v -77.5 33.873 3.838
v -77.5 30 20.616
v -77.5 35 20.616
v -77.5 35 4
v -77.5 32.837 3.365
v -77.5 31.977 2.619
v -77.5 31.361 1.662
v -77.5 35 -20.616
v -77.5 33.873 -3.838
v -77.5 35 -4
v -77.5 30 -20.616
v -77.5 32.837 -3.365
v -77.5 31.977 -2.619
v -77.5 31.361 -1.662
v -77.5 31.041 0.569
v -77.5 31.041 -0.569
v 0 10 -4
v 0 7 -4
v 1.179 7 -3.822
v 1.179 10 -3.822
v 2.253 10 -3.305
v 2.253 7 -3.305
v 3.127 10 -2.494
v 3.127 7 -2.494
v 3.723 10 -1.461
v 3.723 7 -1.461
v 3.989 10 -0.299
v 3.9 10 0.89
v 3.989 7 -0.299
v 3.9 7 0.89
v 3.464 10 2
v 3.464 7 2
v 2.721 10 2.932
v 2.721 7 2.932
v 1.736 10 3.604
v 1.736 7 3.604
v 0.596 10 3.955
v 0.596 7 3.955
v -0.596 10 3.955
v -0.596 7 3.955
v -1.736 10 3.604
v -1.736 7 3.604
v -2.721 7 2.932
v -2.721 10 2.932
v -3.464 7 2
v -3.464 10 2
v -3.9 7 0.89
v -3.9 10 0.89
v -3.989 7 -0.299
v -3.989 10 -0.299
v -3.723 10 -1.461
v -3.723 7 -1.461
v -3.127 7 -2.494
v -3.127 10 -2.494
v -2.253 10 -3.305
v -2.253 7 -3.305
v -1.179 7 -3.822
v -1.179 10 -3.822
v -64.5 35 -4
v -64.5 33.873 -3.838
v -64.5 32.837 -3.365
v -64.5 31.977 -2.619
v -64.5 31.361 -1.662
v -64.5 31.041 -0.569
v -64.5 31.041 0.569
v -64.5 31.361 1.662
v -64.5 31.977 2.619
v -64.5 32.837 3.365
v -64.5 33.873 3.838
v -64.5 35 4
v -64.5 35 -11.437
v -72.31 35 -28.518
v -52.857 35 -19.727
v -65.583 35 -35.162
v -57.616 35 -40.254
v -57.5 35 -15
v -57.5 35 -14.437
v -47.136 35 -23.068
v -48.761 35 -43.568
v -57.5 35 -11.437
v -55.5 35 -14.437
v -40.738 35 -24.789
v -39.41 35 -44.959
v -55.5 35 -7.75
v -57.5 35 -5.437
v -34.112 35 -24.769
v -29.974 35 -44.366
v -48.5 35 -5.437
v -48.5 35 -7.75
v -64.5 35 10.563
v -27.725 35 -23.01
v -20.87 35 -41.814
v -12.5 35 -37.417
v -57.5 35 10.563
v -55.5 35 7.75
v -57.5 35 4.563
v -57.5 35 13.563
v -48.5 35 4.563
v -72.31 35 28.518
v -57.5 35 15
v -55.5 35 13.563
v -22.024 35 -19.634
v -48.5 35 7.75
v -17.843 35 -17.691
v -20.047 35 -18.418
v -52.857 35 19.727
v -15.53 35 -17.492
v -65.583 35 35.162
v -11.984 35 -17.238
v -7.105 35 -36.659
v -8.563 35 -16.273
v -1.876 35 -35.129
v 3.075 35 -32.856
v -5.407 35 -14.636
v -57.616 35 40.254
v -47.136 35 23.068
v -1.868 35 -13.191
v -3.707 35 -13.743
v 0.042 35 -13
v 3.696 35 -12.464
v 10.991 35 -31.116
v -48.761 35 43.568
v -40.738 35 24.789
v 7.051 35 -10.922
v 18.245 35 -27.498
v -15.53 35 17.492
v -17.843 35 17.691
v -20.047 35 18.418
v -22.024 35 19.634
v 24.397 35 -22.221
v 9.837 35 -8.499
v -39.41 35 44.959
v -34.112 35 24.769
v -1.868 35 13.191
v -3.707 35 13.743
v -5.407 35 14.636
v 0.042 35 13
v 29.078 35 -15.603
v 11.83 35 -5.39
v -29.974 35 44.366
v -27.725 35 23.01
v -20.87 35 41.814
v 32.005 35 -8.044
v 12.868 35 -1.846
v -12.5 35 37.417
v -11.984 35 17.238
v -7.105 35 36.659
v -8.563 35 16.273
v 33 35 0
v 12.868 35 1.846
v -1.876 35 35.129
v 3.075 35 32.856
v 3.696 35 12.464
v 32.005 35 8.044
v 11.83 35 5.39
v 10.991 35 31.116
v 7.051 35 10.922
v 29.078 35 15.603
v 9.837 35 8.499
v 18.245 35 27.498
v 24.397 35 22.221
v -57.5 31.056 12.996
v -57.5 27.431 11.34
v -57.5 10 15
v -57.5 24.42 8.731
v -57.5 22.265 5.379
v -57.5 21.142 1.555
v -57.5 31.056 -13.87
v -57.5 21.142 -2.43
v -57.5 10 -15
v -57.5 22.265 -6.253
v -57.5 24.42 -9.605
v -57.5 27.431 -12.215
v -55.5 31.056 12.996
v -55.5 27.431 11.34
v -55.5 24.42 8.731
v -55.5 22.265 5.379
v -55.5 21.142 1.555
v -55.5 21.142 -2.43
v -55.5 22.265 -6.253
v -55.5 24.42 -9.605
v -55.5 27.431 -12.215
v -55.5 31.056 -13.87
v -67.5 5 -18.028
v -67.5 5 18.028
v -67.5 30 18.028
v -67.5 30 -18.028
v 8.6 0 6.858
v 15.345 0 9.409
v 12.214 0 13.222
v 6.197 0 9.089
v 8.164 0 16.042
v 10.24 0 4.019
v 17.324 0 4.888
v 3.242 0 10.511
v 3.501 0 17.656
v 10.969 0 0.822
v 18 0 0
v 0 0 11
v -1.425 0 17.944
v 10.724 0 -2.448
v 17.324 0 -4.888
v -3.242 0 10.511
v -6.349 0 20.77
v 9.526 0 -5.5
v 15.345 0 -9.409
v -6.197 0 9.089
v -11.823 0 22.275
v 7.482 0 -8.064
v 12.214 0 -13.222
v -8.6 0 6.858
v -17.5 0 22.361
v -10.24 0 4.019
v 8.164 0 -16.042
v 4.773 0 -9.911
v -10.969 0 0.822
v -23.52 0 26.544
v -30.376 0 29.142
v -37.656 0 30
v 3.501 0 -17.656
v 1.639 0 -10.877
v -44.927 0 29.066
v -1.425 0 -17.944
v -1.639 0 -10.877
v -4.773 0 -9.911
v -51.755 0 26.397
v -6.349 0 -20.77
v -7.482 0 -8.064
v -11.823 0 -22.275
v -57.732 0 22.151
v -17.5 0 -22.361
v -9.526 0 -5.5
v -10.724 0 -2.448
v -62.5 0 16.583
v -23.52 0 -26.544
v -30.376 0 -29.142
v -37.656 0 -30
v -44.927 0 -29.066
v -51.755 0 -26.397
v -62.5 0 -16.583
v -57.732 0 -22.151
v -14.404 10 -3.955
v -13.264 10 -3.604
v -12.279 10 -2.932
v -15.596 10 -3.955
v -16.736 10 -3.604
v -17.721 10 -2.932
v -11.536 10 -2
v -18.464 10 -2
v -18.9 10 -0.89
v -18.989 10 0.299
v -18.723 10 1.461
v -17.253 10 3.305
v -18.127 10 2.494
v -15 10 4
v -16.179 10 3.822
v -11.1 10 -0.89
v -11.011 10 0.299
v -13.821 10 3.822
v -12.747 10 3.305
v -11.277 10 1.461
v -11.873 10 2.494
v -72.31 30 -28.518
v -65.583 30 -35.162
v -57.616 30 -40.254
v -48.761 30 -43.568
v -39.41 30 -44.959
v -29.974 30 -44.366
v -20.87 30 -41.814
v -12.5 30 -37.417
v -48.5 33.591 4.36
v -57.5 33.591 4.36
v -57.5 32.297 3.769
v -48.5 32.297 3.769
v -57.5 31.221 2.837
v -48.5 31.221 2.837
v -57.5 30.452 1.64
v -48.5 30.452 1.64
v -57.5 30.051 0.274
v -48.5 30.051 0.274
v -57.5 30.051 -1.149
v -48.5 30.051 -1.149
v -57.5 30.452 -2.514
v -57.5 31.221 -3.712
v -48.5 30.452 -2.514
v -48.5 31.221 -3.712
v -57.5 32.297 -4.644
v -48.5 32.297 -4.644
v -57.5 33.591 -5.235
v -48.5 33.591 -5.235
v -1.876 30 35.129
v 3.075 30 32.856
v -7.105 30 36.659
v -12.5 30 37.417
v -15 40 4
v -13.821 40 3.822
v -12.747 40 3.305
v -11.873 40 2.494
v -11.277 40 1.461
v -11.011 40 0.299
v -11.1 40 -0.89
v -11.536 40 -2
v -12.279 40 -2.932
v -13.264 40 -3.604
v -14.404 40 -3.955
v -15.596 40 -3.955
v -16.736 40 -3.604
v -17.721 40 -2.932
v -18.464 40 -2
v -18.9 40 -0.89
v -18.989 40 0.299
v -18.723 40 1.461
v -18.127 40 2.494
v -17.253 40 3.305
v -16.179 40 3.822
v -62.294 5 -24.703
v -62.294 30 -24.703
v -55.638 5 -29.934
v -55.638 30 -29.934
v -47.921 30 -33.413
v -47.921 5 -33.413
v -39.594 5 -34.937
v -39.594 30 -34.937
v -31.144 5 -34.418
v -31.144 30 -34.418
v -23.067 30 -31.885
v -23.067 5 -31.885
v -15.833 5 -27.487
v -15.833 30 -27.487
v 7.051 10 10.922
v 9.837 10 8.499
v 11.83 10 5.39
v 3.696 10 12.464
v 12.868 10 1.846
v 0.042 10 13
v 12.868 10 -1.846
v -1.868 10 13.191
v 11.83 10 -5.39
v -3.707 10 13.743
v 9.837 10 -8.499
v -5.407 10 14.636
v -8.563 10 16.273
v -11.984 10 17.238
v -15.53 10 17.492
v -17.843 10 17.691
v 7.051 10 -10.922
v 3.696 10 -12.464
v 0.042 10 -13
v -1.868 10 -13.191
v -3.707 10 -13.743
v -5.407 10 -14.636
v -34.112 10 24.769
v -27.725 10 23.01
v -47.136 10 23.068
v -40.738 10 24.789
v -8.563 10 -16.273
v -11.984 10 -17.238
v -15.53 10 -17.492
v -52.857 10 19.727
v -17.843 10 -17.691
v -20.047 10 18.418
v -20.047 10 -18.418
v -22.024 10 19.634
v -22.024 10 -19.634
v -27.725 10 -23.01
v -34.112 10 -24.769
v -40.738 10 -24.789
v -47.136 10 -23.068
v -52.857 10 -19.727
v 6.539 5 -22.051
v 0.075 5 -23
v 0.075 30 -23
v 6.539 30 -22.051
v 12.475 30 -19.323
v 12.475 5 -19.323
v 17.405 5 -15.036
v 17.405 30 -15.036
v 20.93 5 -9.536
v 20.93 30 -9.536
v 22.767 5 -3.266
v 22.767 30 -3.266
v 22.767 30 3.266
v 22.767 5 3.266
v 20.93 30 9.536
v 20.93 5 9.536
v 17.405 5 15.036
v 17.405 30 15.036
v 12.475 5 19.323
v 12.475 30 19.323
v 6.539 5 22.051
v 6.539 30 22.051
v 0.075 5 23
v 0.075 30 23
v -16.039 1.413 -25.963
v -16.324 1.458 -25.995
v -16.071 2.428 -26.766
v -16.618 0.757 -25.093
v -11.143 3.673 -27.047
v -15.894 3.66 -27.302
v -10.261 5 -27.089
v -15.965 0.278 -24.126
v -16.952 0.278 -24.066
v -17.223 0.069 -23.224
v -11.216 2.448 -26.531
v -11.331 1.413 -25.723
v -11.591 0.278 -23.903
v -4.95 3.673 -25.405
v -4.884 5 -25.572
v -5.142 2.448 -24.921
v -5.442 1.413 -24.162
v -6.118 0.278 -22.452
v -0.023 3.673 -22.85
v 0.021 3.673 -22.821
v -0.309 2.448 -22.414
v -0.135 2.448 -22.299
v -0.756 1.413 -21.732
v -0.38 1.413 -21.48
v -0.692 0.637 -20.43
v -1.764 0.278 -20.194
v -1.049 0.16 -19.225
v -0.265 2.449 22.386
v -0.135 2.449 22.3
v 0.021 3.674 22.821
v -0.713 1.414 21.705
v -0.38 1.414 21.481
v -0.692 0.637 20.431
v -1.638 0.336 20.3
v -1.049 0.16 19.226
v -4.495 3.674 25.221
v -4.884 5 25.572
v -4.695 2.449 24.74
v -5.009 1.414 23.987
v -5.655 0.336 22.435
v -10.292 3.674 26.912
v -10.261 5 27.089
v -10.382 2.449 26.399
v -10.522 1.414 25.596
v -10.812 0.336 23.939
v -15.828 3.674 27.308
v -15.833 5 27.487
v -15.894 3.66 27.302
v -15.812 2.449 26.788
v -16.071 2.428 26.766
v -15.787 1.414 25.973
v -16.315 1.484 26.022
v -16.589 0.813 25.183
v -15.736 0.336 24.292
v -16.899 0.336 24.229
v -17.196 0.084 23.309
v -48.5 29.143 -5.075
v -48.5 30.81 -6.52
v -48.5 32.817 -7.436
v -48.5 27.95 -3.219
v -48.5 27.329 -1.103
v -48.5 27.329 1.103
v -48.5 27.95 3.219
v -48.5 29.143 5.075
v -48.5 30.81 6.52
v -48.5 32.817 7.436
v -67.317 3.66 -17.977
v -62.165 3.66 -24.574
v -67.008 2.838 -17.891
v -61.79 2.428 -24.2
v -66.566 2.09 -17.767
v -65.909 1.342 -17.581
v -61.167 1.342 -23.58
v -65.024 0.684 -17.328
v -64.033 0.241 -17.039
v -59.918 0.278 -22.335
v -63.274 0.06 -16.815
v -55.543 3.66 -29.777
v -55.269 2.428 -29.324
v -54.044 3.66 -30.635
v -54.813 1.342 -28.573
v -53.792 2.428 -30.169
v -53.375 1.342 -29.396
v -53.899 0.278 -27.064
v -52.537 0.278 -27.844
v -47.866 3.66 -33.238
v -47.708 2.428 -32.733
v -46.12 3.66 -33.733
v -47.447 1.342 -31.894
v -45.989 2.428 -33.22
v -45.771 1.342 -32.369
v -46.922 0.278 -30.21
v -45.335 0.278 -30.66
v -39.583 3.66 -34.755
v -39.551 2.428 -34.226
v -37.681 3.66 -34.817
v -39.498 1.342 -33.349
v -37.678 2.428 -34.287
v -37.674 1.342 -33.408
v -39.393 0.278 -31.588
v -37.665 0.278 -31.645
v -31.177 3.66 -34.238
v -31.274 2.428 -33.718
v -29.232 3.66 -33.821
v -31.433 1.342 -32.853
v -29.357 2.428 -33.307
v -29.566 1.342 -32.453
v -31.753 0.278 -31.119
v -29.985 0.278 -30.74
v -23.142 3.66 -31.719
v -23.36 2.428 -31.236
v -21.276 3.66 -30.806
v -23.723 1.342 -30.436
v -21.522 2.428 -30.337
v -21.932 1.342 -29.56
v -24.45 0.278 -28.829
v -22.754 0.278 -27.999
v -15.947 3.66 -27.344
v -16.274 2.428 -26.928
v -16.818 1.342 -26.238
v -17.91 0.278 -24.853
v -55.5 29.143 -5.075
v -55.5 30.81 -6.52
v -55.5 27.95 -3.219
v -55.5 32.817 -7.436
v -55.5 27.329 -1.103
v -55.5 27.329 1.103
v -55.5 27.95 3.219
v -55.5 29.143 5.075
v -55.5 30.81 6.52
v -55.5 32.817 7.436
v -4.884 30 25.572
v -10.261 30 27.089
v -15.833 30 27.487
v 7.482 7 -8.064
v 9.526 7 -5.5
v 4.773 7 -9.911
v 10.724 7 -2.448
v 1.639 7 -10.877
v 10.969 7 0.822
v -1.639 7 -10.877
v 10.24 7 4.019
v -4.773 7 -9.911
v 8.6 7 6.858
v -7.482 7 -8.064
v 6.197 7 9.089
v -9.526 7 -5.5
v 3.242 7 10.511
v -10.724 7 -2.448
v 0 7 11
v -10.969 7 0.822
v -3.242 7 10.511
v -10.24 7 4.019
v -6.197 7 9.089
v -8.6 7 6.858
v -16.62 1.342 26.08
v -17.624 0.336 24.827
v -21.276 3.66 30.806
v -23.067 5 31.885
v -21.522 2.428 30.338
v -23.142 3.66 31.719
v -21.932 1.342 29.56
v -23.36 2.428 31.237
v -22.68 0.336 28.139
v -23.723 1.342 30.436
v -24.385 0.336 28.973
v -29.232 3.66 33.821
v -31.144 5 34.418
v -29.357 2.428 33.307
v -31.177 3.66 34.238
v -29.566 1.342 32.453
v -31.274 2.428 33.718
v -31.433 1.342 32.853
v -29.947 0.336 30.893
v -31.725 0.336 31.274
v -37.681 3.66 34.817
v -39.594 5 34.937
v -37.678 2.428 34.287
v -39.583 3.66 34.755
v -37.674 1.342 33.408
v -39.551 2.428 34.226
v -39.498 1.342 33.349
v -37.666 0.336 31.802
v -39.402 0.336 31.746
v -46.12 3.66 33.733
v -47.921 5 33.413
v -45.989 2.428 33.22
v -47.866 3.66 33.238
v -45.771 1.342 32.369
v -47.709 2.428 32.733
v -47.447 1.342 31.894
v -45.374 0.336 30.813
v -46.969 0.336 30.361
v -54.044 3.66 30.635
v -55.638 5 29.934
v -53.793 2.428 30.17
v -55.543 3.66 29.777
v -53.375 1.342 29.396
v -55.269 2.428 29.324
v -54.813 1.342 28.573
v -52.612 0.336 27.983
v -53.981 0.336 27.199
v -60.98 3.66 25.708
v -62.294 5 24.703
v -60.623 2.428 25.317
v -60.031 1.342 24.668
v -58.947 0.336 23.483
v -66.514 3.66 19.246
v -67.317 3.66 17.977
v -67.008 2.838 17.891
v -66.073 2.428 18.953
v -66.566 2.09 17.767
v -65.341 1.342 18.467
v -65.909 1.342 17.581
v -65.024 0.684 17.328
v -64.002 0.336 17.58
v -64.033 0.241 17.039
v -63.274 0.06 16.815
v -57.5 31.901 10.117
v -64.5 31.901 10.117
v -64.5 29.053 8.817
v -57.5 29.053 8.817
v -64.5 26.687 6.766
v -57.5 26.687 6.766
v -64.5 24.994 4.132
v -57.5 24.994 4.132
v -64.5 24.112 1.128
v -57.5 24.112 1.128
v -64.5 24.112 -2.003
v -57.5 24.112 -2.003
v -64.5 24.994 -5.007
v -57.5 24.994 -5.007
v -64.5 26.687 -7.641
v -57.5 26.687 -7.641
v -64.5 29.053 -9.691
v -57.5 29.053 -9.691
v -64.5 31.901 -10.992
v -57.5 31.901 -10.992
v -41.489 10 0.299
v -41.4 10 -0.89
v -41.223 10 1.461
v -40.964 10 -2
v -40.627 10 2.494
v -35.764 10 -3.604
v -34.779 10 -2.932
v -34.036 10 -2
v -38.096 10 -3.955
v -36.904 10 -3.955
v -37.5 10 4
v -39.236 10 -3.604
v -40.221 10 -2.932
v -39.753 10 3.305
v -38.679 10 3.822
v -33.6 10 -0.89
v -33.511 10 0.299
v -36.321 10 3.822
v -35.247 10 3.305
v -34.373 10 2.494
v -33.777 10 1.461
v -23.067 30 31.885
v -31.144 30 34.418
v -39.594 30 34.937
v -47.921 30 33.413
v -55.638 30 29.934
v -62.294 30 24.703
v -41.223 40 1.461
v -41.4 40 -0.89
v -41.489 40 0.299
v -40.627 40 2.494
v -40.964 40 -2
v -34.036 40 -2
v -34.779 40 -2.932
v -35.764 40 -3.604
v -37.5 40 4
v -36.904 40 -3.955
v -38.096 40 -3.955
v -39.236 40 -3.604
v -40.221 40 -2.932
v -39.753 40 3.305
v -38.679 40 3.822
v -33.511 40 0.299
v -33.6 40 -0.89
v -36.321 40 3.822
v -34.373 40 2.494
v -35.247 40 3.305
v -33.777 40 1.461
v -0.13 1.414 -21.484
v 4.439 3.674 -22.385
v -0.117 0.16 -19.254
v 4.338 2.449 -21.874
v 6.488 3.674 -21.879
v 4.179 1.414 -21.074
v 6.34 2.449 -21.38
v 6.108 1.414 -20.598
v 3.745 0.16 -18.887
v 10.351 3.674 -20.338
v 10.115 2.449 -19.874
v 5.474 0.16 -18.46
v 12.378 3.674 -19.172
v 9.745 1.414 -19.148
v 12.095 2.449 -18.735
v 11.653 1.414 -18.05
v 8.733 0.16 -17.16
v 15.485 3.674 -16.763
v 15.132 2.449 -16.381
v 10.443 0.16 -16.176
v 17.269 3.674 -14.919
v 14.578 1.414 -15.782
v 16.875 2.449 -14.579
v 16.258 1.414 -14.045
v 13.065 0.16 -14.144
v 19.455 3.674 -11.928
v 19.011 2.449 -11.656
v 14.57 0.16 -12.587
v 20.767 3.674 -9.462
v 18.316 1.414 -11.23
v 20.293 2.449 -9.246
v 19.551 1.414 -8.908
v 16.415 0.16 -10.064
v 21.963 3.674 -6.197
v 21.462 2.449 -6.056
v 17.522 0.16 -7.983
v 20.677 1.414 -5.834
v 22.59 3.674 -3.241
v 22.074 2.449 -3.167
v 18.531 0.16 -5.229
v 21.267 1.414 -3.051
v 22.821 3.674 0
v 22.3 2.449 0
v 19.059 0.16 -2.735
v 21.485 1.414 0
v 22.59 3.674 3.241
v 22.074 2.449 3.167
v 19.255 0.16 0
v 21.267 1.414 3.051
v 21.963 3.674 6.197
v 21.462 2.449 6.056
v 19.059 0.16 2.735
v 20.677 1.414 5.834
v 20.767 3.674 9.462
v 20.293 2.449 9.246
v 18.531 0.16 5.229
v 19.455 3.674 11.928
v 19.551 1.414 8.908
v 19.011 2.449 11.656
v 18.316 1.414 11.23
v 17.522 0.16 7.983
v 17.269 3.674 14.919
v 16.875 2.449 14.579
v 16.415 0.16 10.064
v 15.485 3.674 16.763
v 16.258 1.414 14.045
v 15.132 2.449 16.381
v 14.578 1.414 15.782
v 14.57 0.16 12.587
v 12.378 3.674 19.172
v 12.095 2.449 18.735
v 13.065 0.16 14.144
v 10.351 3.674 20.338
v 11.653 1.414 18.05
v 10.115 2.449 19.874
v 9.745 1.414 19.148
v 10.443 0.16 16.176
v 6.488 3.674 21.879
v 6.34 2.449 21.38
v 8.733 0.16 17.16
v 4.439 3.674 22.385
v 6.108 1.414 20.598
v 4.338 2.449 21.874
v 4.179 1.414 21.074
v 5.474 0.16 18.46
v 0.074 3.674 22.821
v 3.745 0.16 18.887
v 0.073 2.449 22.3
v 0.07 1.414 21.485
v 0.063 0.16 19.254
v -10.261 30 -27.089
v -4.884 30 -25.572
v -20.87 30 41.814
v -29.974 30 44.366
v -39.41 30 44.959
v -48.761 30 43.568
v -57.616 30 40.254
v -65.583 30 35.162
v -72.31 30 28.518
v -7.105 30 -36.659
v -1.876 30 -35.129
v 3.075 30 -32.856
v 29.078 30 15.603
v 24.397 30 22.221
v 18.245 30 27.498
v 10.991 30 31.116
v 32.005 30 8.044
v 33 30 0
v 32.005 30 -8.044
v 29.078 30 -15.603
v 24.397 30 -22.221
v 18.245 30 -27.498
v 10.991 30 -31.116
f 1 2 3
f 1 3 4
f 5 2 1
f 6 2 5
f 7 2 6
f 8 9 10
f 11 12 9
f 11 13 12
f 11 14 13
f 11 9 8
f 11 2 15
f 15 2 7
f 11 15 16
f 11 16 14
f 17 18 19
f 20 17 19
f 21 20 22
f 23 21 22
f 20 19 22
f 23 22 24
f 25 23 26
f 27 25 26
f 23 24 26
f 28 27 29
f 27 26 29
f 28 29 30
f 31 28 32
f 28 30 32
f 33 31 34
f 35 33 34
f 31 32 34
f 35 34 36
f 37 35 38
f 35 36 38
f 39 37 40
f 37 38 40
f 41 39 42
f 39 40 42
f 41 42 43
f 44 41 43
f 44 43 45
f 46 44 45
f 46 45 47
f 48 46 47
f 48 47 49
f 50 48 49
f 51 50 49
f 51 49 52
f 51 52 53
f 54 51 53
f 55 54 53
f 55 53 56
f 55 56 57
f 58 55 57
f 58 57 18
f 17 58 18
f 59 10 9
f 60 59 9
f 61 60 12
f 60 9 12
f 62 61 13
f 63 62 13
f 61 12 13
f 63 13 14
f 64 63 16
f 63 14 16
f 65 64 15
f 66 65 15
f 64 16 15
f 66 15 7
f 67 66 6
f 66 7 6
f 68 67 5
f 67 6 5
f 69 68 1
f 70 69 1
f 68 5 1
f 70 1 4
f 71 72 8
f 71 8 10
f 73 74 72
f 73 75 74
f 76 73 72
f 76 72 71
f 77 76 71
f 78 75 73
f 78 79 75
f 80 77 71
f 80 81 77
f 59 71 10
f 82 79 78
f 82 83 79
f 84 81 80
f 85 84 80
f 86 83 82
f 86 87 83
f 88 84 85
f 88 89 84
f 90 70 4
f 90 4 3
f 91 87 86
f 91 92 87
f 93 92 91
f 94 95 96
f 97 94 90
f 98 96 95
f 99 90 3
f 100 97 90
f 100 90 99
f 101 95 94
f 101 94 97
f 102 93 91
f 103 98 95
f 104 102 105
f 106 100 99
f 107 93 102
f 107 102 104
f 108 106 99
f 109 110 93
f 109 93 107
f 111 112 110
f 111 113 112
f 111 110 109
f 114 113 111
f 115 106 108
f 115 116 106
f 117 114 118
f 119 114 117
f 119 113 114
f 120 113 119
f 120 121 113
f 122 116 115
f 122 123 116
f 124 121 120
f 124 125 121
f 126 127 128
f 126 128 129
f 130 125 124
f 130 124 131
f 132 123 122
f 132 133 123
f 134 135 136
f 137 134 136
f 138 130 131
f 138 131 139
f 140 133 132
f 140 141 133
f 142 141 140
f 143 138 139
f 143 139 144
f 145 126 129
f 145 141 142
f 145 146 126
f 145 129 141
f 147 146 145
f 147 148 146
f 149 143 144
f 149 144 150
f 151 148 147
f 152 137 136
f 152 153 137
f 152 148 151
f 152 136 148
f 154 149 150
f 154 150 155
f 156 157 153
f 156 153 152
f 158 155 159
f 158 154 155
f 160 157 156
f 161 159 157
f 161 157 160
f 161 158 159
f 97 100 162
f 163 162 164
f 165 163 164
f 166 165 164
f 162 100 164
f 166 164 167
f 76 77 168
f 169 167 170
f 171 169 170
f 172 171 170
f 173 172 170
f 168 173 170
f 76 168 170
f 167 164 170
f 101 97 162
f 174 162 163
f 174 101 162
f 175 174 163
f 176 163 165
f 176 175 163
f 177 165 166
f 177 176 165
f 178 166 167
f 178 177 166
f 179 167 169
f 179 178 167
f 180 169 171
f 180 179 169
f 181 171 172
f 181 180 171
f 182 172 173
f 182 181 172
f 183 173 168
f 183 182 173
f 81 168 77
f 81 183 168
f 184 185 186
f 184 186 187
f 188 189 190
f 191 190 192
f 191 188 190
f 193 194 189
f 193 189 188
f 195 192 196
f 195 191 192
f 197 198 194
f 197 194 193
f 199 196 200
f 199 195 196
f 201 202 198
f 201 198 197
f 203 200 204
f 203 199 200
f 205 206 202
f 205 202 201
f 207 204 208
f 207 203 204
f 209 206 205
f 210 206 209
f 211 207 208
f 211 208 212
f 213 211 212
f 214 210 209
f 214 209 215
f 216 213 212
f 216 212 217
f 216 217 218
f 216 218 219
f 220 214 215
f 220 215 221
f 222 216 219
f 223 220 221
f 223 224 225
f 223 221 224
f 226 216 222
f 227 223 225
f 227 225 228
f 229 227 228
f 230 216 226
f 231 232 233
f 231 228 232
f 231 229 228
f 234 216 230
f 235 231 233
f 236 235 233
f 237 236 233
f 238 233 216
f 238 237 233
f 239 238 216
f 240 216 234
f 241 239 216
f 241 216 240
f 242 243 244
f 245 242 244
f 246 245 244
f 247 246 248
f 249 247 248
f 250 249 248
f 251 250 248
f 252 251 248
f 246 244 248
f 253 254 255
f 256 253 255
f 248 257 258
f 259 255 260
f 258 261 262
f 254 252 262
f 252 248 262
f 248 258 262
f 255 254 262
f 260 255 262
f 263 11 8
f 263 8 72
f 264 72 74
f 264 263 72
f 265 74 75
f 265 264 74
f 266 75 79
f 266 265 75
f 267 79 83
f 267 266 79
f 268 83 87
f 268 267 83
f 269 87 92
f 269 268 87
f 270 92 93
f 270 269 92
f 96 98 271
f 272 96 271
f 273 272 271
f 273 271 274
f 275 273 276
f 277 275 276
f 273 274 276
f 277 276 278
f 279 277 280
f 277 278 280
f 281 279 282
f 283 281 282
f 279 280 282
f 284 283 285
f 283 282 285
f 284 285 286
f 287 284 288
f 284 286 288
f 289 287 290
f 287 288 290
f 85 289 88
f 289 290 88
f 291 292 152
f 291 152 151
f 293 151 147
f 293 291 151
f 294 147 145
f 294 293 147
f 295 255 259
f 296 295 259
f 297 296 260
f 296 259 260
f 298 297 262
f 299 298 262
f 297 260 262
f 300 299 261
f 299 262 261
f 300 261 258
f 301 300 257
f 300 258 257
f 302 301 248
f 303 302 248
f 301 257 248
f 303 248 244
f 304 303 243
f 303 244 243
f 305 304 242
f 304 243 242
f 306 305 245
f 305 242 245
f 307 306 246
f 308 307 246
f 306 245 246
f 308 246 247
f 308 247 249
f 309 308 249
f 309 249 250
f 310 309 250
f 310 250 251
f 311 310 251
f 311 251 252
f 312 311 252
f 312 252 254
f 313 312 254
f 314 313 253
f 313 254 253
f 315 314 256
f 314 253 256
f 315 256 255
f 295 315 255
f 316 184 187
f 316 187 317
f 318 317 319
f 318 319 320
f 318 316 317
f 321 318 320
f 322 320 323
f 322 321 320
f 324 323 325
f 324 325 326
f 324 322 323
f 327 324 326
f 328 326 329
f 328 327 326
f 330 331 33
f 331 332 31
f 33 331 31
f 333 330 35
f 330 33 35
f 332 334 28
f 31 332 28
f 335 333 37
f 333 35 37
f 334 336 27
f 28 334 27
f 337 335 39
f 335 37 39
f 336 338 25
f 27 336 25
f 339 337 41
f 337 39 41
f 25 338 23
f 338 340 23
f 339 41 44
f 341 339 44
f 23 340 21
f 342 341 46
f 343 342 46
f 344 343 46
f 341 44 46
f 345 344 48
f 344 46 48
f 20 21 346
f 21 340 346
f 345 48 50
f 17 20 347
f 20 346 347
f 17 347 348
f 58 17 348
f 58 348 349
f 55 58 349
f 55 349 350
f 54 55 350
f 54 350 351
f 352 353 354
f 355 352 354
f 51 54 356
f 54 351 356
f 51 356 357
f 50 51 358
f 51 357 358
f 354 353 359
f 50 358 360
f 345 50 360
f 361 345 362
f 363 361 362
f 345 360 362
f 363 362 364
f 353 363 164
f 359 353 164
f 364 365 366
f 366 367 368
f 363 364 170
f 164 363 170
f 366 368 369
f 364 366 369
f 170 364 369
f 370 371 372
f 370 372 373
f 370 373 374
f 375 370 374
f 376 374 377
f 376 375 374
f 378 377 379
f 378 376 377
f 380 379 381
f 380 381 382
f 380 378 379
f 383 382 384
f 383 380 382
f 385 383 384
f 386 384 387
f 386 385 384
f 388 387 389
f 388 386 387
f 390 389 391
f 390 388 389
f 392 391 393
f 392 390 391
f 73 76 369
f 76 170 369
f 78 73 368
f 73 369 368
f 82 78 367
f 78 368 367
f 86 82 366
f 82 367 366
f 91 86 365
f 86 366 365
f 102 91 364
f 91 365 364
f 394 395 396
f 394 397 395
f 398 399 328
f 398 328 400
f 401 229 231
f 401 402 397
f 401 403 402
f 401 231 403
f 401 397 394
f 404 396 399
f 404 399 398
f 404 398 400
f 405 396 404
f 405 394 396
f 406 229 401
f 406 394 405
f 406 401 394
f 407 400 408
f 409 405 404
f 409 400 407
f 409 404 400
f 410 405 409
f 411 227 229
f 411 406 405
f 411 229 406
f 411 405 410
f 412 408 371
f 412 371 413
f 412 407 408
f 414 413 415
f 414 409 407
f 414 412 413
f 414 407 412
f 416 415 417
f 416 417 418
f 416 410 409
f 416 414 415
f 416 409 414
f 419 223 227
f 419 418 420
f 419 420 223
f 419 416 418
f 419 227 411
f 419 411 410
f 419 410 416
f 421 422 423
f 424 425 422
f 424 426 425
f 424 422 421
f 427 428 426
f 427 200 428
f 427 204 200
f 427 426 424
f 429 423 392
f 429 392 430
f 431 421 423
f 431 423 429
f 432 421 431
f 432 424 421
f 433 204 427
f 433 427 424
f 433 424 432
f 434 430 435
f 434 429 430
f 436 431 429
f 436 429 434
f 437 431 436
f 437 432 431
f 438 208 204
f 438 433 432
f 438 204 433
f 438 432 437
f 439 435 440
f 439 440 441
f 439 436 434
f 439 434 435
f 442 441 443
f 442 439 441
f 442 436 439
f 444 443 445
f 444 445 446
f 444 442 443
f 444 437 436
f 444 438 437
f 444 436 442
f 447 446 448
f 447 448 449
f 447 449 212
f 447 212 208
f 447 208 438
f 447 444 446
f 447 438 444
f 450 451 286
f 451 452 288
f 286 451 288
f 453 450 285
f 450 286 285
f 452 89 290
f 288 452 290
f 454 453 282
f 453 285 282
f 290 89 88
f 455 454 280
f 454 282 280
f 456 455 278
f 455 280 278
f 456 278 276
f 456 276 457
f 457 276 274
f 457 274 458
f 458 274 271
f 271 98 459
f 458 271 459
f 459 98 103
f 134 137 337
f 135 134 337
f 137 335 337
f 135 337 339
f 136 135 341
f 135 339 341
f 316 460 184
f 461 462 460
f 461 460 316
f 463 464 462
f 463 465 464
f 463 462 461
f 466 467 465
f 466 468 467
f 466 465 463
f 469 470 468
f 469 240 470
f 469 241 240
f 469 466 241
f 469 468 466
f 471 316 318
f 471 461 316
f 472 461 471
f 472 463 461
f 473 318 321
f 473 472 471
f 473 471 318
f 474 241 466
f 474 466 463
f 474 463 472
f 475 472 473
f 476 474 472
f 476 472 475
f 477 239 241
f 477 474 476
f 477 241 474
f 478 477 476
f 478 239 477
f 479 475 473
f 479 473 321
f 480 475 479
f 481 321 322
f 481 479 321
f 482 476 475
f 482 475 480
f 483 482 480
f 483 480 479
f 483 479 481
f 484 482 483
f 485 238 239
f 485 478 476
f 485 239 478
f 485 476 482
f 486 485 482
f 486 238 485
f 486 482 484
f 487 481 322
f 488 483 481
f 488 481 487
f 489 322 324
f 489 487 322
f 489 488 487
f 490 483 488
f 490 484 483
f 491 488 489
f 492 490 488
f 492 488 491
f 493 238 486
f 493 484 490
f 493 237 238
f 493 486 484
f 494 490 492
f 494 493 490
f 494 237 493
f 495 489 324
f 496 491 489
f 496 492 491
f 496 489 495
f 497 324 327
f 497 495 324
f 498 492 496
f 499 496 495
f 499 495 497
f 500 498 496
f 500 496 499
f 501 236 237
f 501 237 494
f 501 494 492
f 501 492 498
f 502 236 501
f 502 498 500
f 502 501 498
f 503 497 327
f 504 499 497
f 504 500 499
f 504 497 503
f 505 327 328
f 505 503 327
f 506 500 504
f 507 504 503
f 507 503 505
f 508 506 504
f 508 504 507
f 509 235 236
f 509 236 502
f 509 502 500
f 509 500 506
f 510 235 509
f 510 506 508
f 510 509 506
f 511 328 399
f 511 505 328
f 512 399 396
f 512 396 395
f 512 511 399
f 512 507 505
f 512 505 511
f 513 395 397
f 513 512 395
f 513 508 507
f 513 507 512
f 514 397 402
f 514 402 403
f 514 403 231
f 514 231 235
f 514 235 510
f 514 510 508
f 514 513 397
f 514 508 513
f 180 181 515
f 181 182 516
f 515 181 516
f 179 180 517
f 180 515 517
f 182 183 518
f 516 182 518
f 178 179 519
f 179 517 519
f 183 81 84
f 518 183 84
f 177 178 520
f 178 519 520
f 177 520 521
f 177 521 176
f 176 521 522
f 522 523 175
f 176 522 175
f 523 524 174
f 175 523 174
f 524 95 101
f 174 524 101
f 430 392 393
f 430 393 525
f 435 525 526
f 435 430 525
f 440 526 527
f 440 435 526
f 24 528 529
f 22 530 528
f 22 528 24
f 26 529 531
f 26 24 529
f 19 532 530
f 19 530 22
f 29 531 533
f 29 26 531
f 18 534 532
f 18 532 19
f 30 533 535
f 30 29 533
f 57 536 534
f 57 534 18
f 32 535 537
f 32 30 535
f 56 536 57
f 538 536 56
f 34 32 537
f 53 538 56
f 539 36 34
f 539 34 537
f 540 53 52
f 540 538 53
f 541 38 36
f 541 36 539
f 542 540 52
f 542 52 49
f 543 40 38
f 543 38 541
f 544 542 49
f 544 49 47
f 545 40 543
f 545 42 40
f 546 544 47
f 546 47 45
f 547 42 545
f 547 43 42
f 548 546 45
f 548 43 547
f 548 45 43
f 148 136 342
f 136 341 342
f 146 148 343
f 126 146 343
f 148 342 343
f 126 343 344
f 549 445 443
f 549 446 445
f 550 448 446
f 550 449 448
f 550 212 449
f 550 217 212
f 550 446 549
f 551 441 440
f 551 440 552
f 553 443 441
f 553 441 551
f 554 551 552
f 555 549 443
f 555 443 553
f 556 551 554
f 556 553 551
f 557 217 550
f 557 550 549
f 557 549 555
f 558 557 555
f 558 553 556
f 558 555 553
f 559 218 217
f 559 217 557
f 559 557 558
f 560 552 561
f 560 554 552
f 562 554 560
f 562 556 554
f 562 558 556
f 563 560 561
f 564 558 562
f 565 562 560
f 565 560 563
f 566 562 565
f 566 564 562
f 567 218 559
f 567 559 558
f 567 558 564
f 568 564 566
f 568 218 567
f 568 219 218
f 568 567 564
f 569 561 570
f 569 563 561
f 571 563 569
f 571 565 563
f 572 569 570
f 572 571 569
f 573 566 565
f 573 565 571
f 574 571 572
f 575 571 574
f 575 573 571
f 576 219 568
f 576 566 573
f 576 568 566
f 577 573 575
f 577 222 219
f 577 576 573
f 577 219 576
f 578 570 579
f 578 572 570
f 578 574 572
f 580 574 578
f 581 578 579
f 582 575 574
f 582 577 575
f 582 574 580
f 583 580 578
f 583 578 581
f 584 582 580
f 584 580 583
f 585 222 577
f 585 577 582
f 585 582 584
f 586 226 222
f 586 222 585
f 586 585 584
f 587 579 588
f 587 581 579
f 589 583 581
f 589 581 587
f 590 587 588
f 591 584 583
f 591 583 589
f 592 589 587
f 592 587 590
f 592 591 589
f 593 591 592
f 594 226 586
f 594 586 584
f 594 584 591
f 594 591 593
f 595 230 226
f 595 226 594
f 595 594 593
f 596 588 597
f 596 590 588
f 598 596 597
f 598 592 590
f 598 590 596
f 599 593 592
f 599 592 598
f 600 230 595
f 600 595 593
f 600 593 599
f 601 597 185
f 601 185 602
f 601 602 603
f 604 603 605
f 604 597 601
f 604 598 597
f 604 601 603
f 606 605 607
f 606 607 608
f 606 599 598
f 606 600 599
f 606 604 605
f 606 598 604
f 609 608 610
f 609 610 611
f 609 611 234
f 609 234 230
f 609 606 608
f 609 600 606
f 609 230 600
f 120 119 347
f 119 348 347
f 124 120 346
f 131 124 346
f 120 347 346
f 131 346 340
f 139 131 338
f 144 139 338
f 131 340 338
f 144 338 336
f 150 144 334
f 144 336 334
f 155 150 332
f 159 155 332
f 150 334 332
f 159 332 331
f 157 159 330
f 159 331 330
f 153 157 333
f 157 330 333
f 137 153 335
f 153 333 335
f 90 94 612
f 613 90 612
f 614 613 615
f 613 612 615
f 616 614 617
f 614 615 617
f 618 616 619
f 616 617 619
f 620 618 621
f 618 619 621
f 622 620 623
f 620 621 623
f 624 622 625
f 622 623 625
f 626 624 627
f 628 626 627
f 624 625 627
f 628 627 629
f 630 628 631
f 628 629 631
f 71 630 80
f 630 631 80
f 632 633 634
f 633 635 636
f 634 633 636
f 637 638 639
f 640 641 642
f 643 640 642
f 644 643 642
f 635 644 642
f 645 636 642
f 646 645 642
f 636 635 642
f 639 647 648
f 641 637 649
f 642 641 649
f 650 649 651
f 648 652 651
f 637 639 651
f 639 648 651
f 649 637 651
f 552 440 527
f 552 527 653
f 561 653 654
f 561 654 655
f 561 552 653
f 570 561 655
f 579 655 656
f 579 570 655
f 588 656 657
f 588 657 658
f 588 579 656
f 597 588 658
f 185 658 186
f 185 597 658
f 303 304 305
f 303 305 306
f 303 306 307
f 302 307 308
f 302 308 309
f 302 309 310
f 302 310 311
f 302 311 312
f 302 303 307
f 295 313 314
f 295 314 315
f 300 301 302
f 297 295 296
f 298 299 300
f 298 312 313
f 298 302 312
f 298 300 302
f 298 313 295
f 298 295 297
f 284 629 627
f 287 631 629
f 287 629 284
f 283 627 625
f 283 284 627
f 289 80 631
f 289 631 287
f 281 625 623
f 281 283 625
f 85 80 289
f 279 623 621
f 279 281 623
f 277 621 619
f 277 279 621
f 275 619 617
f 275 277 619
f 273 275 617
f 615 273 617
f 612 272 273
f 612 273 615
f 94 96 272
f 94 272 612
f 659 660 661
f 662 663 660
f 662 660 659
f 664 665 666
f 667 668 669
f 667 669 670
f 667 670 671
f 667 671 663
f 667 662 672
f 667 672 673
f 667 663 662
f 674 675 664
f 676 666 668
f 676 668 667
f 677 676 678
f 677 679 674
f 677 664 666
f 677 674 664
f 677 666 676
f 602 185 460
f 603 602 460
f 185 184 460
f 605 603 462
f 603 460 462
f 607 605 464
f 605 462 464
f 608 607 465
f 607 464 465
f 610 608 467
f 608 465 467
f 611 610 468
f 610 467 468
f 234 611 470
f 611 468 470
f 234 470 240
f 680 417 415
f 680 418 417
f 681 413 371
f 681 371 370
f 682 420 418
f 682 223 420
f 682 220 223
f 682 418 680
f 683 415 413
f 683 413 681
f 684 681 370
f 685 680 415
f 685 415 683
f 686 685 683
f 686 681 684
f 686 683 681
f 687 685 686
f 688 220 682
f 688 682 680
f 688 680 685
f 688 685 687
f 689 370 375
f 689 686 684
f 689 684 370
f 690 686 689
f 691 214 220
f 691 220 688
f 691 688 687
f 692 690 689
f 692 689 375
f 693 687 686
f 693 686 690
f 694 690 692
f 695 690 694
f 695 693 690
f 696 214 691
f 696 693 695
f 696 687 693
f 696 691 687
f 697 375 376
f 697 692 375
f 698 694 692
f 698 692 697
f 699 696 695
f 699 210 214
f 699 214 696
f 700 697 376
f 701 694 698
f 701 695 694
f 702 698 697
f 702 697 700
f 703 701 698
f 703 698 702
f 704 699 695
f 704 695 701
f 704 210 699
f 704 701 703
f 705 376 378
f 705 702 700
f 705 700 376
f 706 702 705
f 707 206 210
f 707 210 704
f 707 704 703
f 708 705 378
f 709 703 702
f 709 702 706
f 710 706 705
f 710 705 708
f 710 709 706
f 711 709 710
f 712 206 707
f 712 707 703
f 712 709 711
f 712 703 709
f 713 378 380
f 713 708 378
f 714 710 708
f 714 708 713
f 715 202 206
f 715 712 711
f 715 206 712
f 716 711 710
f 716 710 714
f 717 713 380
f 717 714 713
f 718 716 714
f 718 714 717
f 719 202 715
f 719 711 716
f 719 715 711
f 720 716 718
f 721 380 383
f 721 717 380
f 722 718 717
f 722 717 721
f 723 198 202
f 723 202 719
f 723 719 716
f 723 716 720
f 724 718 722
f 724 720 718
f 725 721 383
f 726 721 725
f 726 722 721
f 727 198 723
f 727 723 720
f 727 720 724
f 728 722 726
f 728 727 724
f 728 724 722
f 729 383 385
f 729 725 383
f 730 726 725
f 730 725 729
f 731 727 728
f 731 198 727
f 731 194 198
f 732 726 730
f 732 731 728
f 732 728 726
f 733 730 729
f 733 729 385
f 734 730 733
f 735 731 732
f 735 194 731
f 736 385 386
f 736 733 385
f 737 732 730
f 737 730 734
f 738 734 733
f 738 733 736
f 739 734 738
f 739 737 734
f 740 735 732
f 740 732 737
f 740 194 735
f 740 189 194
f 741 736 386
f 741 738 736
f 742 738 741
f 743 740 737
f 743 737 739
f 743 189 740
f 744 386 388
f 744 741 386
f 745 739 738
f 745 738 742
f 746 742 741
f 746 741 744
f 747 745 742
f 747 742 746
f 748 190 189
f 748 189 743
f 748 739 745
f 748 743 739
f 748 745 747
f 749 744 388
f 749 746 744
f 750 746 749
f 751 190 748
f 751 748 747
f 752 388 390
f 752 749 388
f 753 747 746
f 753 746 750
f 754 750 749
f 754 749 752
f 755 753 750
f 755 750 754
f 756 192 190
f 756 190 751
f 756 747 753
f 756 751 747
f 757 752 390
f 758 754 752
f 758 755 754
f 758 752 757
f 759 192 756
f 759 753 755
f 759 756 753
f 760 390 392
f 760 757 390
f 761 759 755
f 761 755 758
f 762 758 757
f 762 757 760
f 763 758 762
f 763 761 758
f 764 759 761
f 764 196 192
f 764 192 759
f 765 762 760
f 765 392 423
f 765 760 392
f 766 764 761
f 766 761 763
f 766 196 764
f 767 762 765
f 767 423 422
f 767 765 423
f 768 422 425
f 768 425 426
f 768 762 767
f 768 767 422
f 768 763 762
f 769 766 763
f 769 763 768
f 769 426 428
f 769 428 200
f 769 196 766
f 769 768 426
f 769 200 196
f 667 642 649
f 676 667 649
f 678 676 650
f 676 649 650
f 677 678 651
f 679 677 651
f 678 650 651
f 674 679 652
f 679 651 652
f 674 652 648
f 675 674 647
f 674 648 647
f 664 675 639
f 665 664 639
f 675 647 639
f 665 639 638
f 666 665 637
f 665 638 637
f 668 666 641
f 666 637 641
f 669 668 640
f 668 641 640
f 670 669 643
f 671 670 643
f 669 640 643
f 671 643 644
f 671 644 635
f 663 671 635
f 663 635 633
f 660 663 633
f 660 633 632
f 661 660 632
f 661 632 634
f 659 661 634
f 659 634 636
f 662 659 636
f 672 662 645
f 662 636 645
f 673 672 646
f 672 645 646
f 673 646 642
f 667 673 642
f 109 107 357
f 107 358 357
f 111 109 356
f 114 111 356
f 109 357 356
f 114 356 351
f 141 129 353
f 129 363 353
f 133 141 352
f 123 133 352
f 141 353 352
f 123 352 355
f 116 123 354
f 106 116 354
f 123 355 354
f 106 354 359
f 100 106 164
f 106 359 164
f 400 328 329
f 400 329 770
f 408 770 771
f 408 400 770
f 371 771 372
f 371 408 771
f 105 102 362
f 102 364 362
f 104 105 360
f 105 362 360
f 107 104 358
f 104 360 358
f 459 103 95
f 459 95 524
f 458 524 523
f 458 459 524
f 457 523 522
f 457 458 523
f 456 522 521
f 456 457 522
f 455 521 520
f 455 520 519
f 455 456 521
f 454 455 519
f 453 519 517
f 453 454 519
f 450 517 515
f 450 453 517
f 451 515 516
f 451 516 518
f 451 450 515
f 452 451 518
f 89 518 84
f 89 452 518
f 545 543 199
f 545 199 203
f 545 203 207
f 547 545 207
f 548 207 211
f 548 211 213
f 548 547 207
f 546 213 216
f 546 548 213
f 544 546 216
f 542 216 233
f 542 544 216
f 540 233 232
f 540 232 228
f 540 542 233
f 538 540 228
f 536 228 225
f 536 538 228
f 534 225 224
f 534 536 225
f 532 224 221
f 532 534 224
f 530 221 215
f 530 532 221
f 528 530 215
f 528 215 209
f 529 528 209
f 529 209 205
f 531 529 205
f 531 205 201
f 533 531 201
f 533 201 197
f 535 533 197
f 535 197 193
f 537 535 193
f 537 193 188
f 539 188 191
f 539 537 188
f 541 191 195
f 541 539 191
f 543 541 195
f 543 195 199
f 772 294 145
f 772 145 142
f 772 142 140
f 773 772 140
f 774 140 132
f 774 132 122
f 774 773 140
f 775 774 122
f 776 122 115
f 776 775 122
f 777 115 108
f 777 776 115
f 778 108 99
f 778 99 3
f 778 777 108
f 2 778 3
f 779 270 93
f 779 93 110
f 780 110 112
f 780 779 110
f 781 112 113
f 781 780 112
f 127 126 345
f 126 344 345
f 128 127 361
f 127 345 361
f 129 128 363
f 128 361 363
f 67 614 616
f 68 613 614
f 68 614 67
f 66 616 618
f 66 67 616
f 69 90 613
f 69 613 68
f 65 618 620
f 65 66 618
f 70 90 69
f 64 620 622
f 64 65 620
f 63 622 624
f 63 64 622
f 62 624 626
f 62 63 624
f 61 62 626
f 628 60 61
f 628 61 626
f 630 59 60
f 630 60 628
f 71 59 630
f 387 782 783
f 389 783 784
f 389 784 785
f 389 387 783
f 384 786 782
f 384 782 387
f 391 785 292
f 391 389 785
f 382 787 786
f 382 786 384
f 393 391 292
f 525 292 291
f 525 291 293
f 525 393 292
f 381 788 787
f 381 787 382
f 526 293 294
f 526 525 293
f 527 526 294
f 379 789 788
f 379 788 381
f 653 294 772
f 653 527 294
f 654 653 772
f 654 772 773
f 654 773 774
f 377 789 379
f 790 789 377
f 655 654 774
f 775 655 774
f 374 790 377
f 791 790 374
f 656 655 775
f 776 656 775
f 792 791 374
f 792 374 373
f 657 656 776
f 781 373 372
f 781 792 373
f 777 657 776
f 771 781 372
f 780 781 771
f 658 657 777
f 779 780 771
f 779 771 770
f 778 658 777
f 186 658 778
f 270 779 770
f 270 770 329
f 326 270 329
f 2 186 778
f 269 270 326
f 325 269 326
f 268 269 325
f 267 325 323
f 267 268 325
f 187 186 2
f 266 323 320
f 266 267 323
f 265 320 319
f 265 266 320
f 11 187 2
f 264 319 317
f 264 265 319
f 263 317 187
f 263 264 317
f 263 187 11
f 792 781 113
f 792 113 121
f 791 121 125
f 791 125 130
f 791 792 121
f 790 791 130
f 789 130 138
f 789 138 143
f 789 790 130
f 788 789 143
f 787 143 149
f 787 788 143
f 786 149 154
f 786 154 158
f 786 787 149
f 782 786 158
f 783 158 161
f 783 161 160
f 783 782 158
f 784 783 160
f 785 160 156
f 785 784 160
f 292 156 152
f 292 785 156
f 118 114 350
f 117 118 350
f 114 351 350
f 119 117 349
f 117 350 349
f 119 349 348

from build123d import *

# Parameters (mm, degrees)
SKETCH1_R             = 4
SKETCH1_R_2           = 11
BOSS_EXTRUDE1_DEPTH   = 10
BOSS_EXTRUDE2_DEPTH   = 30
BOSS_EXTRUDE3_DEPTH   = 5
SKETCH6_R             = 11
CUT_EXTRUDE2_DEPTH    = 7
CUT_EXTRUDE3_REACH    = 126.339
SKETCH3_R             = 4
FILLET1_R             = 5
BOSS_EXTRUDE4_START   = 10
SKETCH1_4_R           = 4
BOSS_EXTRUDE4_DEPTH   = 30
BOSS_EXTRUDE4_2_DEPTH = 30
CUT_EXTRUDE5_START    = 3
SKETCH7_R             = 11
CUT_EXTRUDE5_DEPTH    = 7
SKETCH8_R             = 4
CUT_EXTRUDE6_DEPTH    = 96.5
BOSS_EXTRUDE8_START   = 9
BOSS_EXTRUDE8_DEPTH   = 9
CUT_EXTRUDE7_DEPTH    = 7


with BuildPart() as part:
    # Sketch1 → Boss-Extrude1 (new body)
    # profile 1 of 4: a face of its own
    with BuildSketch(Plane(origin=(0, 0, 0), x_dir=(1, 0, 0), z_dir=(0, 1, 0))):
        with BuildLine():
            ThreePointArc((-15.53030303, -17.49196326), (-18.965809959, -17.990656132), (-22.023809524, -19.633836312))
            ThreePointArc((-22.023809524, -19.633836312), (-40.737950416, -24.78942672), (-57.5, -15))
            Line((-57.5, -15), (-57.5, 15))
            ThreePointArc((-57.5, 15), (-40.737950416, 24.78942672), (-22.023809524, 19.633836312))
            ThreePointArc((-22.023809524, 19.633836312), (-18.965809959, 17.990656132), (-15.53030303, 17.49196326))
            ThreePointArc((-15.53030303, 17.49196326), (-10.248929974, 16.842723462), (-5.406818182, 14.63628582))
            ThreePointArc((-5.406818182, 14.63628582), (-2.801045952, 13.422385369), (0.042391304, 12.999930884))
            ThreePointArc((0.042391304, 12.999930884), (13, 0), (0.042391304, -12.999930884))
            ThreePointArc((0.042391304, -12.999930884), (-2.801045952, -13.422385369), (-5.406818182, -14.63628582))
            ThreePointArc((-5.406818182, -14.63628582), (-10.248929974, -16.842723462), (-15.53030303, -17.49196326))
        make_face()
        with Locations((-37.5, 0)):
            Circle(SKETCH1_R, mode=Mode.SUBTRACT)
        Circle(SKETCH1_R_2, mode=Mode.SUBTRACT)
        with Locations((-15, 0)):
            Circle(SKETCH1_R, mode=Mode.SUBTRACT)
    # profile 2 of 4: a face of its own
    with BuildSketch(Plane(origin=(0, 0, 0), x_dir=(1, 0, 0), z_dir=(0, 1, 0))):
        with Locations((-37.5, 0)):
            Circle(SKETCH1_R)
    # profile 3 of 4: a face of its own
    with BuildSketch(Plane(origin=(0, 0, 0), x_dir=(1, 0, 0), z_dir=(0, 1, 0))):
        with Locations((-15, 0)):
            Circle(SKETCH1_R)
    # profile 4 of 4: a face of its own
    with BuildSketch(Plane(origin=(0, 0, 0), x_dir=(1, 0, 0), z_dir=(0, 1, 0))):
        Circle(SKETCH1_R_2)
    extrude(amount=BOSS_EXTRUDE1_DEPTH)

    # Sketch1<3> → Boss-Extrude2 (add)
    with BuildSketch(Plane(origin=(0, 0, 0), x_dir=(1, 0, 0), z_dir=(0, 1, 0))):
        with BuildLine():
            Line((-67.5, -18.027756377), (-67.5, 18.027756377))
            ThreePointArc((-67.5, 18.027756377), (-43.803347329, 34.427718665), (-15.833333333, 27.487370837))
            ThreePointArc((-15.833333333, 27.487370837), (-7.534032816, 26.467136868), (0.075, 22.999877717))
            ThreePointArc((0.075, 22.999877717), (23, 0), (0.075, -22.999877717))
            ThreePointArc((0.075, -22.999877717), (-7.534032816, -26.467136868), (-15.833333333, -27.487370837))
            ThreePointArc((-15.833333333, -27.487370837), (-43.803347329, -34.427718665), (-67.5, -18.027756377))
        make_face()
        with BuildLine():
            Line((-57.5, -15), (-57.5, 15))
            ThreePointArc((-57.5, 15), (-40.737950416, 24.78942672), (-22.023809524, 19.633836312))
            ThreePointArc((-22.023809524, 19.633836312), (-18.965809959, 17.990656132), (-15.53030303, 17.49196326))
            ThreePointArc((-15.53030303, 17.49196326), (-10.248929974, 16.842723462), (-5.406818182, 14.63628582))
            ThreePointArc((-5.406818182, 14.63628582), (-2.801045952, 13.422385369), (0.042391304, 12.999930884))
            ThreePointArc((0.042391304, 12.999930884), (13, 0), (0.042391304, -12.999930884))
            ThreePointArc((0.042391304, -12.999930884), (-2.801045952, -13.422385369), (-5.406818182, -14.63628582))
            ThreePointArc((-5.406818182, -14.63628582), (-10.248929974, -16.842723462), (-15.53030303, -17.49196326))
            ThreePointArc((-15.53030303, -17.49196326), (-18.965809959, -17.990656132), (-22.023809524, -19.633836312))
            ThreePointArc((-22.023809524, -19.633836312), (-40.737950416, -24.78942672), (-57.5, -15))
        make_face(mode=Mode.SUBTRACT)
    extrude(amount=BOSS_EXTRUDE2_DEPTH)

    # Sketch2 → Boss-Extrude3 (add)
    with BuildSketch(Plane(origin=(0, 30, 0), x_dir=(1, 0, 0), z_dir=(0, 1, 0))):
        with BuildLine():
            Line((-77.5, -20.615528128), (-77.5, 20.615528128))
            ThreePointArc((-77.5, 20.615528128), (-48.761384661, 43.568121551), (-12.5, 37.416573868))
            ThreePointArc((-12.5, 37.416573868), (-4.462855904, 35.989145507), (3.075, 32.856420605))
            ThreePointArc((3.075, 32.856420605), (33, 0), (3.075, -32.856420605))
            ThreePointArc((3.075, -32.856420605), (-4.462855904, -35.989145507), (-12.5, -37.416573868))
            ThreePointArc((-12.5, -37.416573868), (-48.761384661, -43.568121551), (-77.5, -20.615528128))
        make_face()
        with BuildLine():
            Line((-57.5, -15), (-57.5, 15))
            ThreePointArc((-57.5, 15), (-40.737950416, 24.78942672), (-22.023809524, 19.633836312))
            ThreePointArc((-22.023809524, 19.633836312), (-18.965809959, 17.990656132), (-15.53030303, 17.49196326))
            ThreePointArc((-15.53030303, 17.49196326), (-10.248929974, 16.842723462), (-5.406818182, 14.63628582))
            ThreePointArc((-5.406818182, 14.63628582), (-2.801045952, 13.422385369), (0.042391304, 12.999930884))
            ThreePointArc((0.042391304, 12.999930884), (13, 0), (0.042391304, -12.999930884))
            ThreePointArc((0.042391304, -12.999930884), (-2.801045952, -13.422385369), (-5.406818182, -14.63628582))
            ThreePointArc((-5.406818182, -14.63628582), (-10.248929974, -16.842723462), (-15.53030303, -17.49196326))
            ThreePointArc((-15.53030303, -17.49196326), (-18.965809959, -17.990656132), (-22.023809524, -19.633836312))
            ThreePointArc((-22.023809524, -19.633836312), (-40.737950416, -24.78942672), (-57.5, -15))
        make_face(mode=Mode.SUBTRACT)
    extrude(amount=BOSS_EXTRUDE3_DEPTH)

    # Sketch6 → Cut-Extrude2 (cut)
    with BuildSketch(Plane(origin=(-57.5, 0, 0), x_dir=(0, 0, -1), z_dir=(1, 0, 0))):
        with Locations((0.437281594, 35)):
            Circle(SKETCH6_R)
    extrude(amount=-CUT_EXTRUDE2_DEPTH, mode=Mode.SUBTRACT)

    # Sketch3 → Cut-Extrude3 (cut, up to next)
    with BuildSketch(Plane.ZY.offset(77.5), mode=Mode.PRIVATE) as cut_extrude3_sk1:
        with Locations((0, 35)):
            Circle(SKETCH3_R)
    cut_extrude3_tool1 = extrude(cut_extrude3_sk1.sketch, amount=-CUT_EXTRUDE3_REACH, mode=Mode.PRIVATE) & part.part
    add(cut_extrude3_tool1.solids().sort_by_distance((-77.5, 35, 0))[0], mode=Mode.SUBTRACT)

    # Fillet1
    fillet1_edges = [part.edges().sort_by_distance(p)[0] for p in [
        (-43.803347329, 0, 34.427718665),
        (-7.534032816, 0, 26.467136868),
        (23, 0, 0),
        (-7.534032816, 0, -26.467136868),
        (-43.803347329, 0, -34.427718665),
        (-67.5, 0, 0),
    ]]
    fillet(fillet1_edges, radius=FILLET1_R - 0.0001)  # a hair under: the kernel refuses the full size

    # Sketch7 → Cut-Extrude5 (cut)
    with BuildSketch(Plane.XZ.offset(-10).offset(CUT_EXTRUDE5_START)):
        with Locations(Location((0, 0, 0), (0, 0, 90))):
            Circle(SKETCH7_R)
    extrude(amount=CUT_EXTRUDE5_DEPTH, mode=Mode.SUBTRACT)

    # Sketch8 → Cut-Extrude6 (cut, through all)
    with BuildSketch(Plane.XZ.offset(-7)):
        with Locations(Location((0, 0, 0), (0, 0, 270))):
            Circle(SKETCH8_R)
    extrude(amount=-CUT_EXTRUDE6_DEPTH, mode=Mode.SUBTRACT)

    # Sketch9 → Boss-Extrude8 (add)
    with BuildSketch(Plane(origin=(-57.5, 0, 0), x_dir=(0, 0, -1), z_dir=(1, 0, 0)).offset(BOSS_EXTRUDE8_START)):
        with BuildLine():
            ThreePointArc((-4.562718406, 35), (0.437281594, 30), (5.437281594, 35))
            Line((5.437281594, 35), (11.437281594, 35))
            ThreePointArc((11.437281594, 35), (0.437281594, 24), (-10.562718406, 35))
            Line((-10.562718406, 35), (-4.562718406, 35))
        make_face()
        with BuildLine():
            Line((-10.562718406, 35), (-13.562718406, 35))
            ThreePointArc((-13.562718406, 35), (0.437281594, 21), (14.437281594, 35))
            Line((14.437281594, 35), (11.437281594, 35))
            ThreePointArc((11.437281594, 35), (0.437281594, 24), (-10.562718406, 35))
        make_face()
    extrude(amount=-BOSS_EXTRUDE8_DEPTH)

    # Sketch11 → Cut-Extrude7 (cut)
    with BuildSketch(Plane(origin=(-48.5, 0, 0), x_dir=(0, 0, -1), z_dir=(1, 0, 0))):
        with BuildLine():
            Line((-13.562718406, 35), (-7.75, 35))
            ThreePointArc((-7.75, 35), (0, 27.25), (7.75, 35))
            Line((7.75, 35), (14.437281594, 35))
            ThreePointArc((14.437281594, 35), (0.437281594, 21), (-13.562718406, 35))
        make_face()
    extrude(amount=-CUT_EXTRUDE7_DEPTH, mode=Mode.SUBTRACT)


with BuildPart() as body_2:
    # Sketch1<4> → Boss-Extrude4 (new body)
    with BuildSketch(Plane(origin=(0, 0, 0), x_dir=(1, 0, 0), z_dir=(0, 1, 0)).offset(BOSS_EXTRUDE4_START)):
        with Locations(Location((-37.5, 0, 0), (0, 0, 270))):
            Circle(SKETCH1_4_R)
    extrude(amount=BOSS_EXTRUDE4_DEPTH)


with BuildPart() as body_3:
    # Sketch1<4> → Boss-Extrude4 2 (new body)
    with BuildSketch(Plane(origin=(0, 0, 0), x_dir=(1, 0, 0), z_dir=(0, 1, 0)).offset(BOSS_EXTRUDE4_START)):
        with Locations(Location((-15, 0, 0), (0, 0, 270))):
            Circle(SKETCH1_4_R)
    extrude(amount=BOSS_EXTRUDE4_2_DEPTH)


solid = Compound([part.part, body_2.part, body_3.part])
